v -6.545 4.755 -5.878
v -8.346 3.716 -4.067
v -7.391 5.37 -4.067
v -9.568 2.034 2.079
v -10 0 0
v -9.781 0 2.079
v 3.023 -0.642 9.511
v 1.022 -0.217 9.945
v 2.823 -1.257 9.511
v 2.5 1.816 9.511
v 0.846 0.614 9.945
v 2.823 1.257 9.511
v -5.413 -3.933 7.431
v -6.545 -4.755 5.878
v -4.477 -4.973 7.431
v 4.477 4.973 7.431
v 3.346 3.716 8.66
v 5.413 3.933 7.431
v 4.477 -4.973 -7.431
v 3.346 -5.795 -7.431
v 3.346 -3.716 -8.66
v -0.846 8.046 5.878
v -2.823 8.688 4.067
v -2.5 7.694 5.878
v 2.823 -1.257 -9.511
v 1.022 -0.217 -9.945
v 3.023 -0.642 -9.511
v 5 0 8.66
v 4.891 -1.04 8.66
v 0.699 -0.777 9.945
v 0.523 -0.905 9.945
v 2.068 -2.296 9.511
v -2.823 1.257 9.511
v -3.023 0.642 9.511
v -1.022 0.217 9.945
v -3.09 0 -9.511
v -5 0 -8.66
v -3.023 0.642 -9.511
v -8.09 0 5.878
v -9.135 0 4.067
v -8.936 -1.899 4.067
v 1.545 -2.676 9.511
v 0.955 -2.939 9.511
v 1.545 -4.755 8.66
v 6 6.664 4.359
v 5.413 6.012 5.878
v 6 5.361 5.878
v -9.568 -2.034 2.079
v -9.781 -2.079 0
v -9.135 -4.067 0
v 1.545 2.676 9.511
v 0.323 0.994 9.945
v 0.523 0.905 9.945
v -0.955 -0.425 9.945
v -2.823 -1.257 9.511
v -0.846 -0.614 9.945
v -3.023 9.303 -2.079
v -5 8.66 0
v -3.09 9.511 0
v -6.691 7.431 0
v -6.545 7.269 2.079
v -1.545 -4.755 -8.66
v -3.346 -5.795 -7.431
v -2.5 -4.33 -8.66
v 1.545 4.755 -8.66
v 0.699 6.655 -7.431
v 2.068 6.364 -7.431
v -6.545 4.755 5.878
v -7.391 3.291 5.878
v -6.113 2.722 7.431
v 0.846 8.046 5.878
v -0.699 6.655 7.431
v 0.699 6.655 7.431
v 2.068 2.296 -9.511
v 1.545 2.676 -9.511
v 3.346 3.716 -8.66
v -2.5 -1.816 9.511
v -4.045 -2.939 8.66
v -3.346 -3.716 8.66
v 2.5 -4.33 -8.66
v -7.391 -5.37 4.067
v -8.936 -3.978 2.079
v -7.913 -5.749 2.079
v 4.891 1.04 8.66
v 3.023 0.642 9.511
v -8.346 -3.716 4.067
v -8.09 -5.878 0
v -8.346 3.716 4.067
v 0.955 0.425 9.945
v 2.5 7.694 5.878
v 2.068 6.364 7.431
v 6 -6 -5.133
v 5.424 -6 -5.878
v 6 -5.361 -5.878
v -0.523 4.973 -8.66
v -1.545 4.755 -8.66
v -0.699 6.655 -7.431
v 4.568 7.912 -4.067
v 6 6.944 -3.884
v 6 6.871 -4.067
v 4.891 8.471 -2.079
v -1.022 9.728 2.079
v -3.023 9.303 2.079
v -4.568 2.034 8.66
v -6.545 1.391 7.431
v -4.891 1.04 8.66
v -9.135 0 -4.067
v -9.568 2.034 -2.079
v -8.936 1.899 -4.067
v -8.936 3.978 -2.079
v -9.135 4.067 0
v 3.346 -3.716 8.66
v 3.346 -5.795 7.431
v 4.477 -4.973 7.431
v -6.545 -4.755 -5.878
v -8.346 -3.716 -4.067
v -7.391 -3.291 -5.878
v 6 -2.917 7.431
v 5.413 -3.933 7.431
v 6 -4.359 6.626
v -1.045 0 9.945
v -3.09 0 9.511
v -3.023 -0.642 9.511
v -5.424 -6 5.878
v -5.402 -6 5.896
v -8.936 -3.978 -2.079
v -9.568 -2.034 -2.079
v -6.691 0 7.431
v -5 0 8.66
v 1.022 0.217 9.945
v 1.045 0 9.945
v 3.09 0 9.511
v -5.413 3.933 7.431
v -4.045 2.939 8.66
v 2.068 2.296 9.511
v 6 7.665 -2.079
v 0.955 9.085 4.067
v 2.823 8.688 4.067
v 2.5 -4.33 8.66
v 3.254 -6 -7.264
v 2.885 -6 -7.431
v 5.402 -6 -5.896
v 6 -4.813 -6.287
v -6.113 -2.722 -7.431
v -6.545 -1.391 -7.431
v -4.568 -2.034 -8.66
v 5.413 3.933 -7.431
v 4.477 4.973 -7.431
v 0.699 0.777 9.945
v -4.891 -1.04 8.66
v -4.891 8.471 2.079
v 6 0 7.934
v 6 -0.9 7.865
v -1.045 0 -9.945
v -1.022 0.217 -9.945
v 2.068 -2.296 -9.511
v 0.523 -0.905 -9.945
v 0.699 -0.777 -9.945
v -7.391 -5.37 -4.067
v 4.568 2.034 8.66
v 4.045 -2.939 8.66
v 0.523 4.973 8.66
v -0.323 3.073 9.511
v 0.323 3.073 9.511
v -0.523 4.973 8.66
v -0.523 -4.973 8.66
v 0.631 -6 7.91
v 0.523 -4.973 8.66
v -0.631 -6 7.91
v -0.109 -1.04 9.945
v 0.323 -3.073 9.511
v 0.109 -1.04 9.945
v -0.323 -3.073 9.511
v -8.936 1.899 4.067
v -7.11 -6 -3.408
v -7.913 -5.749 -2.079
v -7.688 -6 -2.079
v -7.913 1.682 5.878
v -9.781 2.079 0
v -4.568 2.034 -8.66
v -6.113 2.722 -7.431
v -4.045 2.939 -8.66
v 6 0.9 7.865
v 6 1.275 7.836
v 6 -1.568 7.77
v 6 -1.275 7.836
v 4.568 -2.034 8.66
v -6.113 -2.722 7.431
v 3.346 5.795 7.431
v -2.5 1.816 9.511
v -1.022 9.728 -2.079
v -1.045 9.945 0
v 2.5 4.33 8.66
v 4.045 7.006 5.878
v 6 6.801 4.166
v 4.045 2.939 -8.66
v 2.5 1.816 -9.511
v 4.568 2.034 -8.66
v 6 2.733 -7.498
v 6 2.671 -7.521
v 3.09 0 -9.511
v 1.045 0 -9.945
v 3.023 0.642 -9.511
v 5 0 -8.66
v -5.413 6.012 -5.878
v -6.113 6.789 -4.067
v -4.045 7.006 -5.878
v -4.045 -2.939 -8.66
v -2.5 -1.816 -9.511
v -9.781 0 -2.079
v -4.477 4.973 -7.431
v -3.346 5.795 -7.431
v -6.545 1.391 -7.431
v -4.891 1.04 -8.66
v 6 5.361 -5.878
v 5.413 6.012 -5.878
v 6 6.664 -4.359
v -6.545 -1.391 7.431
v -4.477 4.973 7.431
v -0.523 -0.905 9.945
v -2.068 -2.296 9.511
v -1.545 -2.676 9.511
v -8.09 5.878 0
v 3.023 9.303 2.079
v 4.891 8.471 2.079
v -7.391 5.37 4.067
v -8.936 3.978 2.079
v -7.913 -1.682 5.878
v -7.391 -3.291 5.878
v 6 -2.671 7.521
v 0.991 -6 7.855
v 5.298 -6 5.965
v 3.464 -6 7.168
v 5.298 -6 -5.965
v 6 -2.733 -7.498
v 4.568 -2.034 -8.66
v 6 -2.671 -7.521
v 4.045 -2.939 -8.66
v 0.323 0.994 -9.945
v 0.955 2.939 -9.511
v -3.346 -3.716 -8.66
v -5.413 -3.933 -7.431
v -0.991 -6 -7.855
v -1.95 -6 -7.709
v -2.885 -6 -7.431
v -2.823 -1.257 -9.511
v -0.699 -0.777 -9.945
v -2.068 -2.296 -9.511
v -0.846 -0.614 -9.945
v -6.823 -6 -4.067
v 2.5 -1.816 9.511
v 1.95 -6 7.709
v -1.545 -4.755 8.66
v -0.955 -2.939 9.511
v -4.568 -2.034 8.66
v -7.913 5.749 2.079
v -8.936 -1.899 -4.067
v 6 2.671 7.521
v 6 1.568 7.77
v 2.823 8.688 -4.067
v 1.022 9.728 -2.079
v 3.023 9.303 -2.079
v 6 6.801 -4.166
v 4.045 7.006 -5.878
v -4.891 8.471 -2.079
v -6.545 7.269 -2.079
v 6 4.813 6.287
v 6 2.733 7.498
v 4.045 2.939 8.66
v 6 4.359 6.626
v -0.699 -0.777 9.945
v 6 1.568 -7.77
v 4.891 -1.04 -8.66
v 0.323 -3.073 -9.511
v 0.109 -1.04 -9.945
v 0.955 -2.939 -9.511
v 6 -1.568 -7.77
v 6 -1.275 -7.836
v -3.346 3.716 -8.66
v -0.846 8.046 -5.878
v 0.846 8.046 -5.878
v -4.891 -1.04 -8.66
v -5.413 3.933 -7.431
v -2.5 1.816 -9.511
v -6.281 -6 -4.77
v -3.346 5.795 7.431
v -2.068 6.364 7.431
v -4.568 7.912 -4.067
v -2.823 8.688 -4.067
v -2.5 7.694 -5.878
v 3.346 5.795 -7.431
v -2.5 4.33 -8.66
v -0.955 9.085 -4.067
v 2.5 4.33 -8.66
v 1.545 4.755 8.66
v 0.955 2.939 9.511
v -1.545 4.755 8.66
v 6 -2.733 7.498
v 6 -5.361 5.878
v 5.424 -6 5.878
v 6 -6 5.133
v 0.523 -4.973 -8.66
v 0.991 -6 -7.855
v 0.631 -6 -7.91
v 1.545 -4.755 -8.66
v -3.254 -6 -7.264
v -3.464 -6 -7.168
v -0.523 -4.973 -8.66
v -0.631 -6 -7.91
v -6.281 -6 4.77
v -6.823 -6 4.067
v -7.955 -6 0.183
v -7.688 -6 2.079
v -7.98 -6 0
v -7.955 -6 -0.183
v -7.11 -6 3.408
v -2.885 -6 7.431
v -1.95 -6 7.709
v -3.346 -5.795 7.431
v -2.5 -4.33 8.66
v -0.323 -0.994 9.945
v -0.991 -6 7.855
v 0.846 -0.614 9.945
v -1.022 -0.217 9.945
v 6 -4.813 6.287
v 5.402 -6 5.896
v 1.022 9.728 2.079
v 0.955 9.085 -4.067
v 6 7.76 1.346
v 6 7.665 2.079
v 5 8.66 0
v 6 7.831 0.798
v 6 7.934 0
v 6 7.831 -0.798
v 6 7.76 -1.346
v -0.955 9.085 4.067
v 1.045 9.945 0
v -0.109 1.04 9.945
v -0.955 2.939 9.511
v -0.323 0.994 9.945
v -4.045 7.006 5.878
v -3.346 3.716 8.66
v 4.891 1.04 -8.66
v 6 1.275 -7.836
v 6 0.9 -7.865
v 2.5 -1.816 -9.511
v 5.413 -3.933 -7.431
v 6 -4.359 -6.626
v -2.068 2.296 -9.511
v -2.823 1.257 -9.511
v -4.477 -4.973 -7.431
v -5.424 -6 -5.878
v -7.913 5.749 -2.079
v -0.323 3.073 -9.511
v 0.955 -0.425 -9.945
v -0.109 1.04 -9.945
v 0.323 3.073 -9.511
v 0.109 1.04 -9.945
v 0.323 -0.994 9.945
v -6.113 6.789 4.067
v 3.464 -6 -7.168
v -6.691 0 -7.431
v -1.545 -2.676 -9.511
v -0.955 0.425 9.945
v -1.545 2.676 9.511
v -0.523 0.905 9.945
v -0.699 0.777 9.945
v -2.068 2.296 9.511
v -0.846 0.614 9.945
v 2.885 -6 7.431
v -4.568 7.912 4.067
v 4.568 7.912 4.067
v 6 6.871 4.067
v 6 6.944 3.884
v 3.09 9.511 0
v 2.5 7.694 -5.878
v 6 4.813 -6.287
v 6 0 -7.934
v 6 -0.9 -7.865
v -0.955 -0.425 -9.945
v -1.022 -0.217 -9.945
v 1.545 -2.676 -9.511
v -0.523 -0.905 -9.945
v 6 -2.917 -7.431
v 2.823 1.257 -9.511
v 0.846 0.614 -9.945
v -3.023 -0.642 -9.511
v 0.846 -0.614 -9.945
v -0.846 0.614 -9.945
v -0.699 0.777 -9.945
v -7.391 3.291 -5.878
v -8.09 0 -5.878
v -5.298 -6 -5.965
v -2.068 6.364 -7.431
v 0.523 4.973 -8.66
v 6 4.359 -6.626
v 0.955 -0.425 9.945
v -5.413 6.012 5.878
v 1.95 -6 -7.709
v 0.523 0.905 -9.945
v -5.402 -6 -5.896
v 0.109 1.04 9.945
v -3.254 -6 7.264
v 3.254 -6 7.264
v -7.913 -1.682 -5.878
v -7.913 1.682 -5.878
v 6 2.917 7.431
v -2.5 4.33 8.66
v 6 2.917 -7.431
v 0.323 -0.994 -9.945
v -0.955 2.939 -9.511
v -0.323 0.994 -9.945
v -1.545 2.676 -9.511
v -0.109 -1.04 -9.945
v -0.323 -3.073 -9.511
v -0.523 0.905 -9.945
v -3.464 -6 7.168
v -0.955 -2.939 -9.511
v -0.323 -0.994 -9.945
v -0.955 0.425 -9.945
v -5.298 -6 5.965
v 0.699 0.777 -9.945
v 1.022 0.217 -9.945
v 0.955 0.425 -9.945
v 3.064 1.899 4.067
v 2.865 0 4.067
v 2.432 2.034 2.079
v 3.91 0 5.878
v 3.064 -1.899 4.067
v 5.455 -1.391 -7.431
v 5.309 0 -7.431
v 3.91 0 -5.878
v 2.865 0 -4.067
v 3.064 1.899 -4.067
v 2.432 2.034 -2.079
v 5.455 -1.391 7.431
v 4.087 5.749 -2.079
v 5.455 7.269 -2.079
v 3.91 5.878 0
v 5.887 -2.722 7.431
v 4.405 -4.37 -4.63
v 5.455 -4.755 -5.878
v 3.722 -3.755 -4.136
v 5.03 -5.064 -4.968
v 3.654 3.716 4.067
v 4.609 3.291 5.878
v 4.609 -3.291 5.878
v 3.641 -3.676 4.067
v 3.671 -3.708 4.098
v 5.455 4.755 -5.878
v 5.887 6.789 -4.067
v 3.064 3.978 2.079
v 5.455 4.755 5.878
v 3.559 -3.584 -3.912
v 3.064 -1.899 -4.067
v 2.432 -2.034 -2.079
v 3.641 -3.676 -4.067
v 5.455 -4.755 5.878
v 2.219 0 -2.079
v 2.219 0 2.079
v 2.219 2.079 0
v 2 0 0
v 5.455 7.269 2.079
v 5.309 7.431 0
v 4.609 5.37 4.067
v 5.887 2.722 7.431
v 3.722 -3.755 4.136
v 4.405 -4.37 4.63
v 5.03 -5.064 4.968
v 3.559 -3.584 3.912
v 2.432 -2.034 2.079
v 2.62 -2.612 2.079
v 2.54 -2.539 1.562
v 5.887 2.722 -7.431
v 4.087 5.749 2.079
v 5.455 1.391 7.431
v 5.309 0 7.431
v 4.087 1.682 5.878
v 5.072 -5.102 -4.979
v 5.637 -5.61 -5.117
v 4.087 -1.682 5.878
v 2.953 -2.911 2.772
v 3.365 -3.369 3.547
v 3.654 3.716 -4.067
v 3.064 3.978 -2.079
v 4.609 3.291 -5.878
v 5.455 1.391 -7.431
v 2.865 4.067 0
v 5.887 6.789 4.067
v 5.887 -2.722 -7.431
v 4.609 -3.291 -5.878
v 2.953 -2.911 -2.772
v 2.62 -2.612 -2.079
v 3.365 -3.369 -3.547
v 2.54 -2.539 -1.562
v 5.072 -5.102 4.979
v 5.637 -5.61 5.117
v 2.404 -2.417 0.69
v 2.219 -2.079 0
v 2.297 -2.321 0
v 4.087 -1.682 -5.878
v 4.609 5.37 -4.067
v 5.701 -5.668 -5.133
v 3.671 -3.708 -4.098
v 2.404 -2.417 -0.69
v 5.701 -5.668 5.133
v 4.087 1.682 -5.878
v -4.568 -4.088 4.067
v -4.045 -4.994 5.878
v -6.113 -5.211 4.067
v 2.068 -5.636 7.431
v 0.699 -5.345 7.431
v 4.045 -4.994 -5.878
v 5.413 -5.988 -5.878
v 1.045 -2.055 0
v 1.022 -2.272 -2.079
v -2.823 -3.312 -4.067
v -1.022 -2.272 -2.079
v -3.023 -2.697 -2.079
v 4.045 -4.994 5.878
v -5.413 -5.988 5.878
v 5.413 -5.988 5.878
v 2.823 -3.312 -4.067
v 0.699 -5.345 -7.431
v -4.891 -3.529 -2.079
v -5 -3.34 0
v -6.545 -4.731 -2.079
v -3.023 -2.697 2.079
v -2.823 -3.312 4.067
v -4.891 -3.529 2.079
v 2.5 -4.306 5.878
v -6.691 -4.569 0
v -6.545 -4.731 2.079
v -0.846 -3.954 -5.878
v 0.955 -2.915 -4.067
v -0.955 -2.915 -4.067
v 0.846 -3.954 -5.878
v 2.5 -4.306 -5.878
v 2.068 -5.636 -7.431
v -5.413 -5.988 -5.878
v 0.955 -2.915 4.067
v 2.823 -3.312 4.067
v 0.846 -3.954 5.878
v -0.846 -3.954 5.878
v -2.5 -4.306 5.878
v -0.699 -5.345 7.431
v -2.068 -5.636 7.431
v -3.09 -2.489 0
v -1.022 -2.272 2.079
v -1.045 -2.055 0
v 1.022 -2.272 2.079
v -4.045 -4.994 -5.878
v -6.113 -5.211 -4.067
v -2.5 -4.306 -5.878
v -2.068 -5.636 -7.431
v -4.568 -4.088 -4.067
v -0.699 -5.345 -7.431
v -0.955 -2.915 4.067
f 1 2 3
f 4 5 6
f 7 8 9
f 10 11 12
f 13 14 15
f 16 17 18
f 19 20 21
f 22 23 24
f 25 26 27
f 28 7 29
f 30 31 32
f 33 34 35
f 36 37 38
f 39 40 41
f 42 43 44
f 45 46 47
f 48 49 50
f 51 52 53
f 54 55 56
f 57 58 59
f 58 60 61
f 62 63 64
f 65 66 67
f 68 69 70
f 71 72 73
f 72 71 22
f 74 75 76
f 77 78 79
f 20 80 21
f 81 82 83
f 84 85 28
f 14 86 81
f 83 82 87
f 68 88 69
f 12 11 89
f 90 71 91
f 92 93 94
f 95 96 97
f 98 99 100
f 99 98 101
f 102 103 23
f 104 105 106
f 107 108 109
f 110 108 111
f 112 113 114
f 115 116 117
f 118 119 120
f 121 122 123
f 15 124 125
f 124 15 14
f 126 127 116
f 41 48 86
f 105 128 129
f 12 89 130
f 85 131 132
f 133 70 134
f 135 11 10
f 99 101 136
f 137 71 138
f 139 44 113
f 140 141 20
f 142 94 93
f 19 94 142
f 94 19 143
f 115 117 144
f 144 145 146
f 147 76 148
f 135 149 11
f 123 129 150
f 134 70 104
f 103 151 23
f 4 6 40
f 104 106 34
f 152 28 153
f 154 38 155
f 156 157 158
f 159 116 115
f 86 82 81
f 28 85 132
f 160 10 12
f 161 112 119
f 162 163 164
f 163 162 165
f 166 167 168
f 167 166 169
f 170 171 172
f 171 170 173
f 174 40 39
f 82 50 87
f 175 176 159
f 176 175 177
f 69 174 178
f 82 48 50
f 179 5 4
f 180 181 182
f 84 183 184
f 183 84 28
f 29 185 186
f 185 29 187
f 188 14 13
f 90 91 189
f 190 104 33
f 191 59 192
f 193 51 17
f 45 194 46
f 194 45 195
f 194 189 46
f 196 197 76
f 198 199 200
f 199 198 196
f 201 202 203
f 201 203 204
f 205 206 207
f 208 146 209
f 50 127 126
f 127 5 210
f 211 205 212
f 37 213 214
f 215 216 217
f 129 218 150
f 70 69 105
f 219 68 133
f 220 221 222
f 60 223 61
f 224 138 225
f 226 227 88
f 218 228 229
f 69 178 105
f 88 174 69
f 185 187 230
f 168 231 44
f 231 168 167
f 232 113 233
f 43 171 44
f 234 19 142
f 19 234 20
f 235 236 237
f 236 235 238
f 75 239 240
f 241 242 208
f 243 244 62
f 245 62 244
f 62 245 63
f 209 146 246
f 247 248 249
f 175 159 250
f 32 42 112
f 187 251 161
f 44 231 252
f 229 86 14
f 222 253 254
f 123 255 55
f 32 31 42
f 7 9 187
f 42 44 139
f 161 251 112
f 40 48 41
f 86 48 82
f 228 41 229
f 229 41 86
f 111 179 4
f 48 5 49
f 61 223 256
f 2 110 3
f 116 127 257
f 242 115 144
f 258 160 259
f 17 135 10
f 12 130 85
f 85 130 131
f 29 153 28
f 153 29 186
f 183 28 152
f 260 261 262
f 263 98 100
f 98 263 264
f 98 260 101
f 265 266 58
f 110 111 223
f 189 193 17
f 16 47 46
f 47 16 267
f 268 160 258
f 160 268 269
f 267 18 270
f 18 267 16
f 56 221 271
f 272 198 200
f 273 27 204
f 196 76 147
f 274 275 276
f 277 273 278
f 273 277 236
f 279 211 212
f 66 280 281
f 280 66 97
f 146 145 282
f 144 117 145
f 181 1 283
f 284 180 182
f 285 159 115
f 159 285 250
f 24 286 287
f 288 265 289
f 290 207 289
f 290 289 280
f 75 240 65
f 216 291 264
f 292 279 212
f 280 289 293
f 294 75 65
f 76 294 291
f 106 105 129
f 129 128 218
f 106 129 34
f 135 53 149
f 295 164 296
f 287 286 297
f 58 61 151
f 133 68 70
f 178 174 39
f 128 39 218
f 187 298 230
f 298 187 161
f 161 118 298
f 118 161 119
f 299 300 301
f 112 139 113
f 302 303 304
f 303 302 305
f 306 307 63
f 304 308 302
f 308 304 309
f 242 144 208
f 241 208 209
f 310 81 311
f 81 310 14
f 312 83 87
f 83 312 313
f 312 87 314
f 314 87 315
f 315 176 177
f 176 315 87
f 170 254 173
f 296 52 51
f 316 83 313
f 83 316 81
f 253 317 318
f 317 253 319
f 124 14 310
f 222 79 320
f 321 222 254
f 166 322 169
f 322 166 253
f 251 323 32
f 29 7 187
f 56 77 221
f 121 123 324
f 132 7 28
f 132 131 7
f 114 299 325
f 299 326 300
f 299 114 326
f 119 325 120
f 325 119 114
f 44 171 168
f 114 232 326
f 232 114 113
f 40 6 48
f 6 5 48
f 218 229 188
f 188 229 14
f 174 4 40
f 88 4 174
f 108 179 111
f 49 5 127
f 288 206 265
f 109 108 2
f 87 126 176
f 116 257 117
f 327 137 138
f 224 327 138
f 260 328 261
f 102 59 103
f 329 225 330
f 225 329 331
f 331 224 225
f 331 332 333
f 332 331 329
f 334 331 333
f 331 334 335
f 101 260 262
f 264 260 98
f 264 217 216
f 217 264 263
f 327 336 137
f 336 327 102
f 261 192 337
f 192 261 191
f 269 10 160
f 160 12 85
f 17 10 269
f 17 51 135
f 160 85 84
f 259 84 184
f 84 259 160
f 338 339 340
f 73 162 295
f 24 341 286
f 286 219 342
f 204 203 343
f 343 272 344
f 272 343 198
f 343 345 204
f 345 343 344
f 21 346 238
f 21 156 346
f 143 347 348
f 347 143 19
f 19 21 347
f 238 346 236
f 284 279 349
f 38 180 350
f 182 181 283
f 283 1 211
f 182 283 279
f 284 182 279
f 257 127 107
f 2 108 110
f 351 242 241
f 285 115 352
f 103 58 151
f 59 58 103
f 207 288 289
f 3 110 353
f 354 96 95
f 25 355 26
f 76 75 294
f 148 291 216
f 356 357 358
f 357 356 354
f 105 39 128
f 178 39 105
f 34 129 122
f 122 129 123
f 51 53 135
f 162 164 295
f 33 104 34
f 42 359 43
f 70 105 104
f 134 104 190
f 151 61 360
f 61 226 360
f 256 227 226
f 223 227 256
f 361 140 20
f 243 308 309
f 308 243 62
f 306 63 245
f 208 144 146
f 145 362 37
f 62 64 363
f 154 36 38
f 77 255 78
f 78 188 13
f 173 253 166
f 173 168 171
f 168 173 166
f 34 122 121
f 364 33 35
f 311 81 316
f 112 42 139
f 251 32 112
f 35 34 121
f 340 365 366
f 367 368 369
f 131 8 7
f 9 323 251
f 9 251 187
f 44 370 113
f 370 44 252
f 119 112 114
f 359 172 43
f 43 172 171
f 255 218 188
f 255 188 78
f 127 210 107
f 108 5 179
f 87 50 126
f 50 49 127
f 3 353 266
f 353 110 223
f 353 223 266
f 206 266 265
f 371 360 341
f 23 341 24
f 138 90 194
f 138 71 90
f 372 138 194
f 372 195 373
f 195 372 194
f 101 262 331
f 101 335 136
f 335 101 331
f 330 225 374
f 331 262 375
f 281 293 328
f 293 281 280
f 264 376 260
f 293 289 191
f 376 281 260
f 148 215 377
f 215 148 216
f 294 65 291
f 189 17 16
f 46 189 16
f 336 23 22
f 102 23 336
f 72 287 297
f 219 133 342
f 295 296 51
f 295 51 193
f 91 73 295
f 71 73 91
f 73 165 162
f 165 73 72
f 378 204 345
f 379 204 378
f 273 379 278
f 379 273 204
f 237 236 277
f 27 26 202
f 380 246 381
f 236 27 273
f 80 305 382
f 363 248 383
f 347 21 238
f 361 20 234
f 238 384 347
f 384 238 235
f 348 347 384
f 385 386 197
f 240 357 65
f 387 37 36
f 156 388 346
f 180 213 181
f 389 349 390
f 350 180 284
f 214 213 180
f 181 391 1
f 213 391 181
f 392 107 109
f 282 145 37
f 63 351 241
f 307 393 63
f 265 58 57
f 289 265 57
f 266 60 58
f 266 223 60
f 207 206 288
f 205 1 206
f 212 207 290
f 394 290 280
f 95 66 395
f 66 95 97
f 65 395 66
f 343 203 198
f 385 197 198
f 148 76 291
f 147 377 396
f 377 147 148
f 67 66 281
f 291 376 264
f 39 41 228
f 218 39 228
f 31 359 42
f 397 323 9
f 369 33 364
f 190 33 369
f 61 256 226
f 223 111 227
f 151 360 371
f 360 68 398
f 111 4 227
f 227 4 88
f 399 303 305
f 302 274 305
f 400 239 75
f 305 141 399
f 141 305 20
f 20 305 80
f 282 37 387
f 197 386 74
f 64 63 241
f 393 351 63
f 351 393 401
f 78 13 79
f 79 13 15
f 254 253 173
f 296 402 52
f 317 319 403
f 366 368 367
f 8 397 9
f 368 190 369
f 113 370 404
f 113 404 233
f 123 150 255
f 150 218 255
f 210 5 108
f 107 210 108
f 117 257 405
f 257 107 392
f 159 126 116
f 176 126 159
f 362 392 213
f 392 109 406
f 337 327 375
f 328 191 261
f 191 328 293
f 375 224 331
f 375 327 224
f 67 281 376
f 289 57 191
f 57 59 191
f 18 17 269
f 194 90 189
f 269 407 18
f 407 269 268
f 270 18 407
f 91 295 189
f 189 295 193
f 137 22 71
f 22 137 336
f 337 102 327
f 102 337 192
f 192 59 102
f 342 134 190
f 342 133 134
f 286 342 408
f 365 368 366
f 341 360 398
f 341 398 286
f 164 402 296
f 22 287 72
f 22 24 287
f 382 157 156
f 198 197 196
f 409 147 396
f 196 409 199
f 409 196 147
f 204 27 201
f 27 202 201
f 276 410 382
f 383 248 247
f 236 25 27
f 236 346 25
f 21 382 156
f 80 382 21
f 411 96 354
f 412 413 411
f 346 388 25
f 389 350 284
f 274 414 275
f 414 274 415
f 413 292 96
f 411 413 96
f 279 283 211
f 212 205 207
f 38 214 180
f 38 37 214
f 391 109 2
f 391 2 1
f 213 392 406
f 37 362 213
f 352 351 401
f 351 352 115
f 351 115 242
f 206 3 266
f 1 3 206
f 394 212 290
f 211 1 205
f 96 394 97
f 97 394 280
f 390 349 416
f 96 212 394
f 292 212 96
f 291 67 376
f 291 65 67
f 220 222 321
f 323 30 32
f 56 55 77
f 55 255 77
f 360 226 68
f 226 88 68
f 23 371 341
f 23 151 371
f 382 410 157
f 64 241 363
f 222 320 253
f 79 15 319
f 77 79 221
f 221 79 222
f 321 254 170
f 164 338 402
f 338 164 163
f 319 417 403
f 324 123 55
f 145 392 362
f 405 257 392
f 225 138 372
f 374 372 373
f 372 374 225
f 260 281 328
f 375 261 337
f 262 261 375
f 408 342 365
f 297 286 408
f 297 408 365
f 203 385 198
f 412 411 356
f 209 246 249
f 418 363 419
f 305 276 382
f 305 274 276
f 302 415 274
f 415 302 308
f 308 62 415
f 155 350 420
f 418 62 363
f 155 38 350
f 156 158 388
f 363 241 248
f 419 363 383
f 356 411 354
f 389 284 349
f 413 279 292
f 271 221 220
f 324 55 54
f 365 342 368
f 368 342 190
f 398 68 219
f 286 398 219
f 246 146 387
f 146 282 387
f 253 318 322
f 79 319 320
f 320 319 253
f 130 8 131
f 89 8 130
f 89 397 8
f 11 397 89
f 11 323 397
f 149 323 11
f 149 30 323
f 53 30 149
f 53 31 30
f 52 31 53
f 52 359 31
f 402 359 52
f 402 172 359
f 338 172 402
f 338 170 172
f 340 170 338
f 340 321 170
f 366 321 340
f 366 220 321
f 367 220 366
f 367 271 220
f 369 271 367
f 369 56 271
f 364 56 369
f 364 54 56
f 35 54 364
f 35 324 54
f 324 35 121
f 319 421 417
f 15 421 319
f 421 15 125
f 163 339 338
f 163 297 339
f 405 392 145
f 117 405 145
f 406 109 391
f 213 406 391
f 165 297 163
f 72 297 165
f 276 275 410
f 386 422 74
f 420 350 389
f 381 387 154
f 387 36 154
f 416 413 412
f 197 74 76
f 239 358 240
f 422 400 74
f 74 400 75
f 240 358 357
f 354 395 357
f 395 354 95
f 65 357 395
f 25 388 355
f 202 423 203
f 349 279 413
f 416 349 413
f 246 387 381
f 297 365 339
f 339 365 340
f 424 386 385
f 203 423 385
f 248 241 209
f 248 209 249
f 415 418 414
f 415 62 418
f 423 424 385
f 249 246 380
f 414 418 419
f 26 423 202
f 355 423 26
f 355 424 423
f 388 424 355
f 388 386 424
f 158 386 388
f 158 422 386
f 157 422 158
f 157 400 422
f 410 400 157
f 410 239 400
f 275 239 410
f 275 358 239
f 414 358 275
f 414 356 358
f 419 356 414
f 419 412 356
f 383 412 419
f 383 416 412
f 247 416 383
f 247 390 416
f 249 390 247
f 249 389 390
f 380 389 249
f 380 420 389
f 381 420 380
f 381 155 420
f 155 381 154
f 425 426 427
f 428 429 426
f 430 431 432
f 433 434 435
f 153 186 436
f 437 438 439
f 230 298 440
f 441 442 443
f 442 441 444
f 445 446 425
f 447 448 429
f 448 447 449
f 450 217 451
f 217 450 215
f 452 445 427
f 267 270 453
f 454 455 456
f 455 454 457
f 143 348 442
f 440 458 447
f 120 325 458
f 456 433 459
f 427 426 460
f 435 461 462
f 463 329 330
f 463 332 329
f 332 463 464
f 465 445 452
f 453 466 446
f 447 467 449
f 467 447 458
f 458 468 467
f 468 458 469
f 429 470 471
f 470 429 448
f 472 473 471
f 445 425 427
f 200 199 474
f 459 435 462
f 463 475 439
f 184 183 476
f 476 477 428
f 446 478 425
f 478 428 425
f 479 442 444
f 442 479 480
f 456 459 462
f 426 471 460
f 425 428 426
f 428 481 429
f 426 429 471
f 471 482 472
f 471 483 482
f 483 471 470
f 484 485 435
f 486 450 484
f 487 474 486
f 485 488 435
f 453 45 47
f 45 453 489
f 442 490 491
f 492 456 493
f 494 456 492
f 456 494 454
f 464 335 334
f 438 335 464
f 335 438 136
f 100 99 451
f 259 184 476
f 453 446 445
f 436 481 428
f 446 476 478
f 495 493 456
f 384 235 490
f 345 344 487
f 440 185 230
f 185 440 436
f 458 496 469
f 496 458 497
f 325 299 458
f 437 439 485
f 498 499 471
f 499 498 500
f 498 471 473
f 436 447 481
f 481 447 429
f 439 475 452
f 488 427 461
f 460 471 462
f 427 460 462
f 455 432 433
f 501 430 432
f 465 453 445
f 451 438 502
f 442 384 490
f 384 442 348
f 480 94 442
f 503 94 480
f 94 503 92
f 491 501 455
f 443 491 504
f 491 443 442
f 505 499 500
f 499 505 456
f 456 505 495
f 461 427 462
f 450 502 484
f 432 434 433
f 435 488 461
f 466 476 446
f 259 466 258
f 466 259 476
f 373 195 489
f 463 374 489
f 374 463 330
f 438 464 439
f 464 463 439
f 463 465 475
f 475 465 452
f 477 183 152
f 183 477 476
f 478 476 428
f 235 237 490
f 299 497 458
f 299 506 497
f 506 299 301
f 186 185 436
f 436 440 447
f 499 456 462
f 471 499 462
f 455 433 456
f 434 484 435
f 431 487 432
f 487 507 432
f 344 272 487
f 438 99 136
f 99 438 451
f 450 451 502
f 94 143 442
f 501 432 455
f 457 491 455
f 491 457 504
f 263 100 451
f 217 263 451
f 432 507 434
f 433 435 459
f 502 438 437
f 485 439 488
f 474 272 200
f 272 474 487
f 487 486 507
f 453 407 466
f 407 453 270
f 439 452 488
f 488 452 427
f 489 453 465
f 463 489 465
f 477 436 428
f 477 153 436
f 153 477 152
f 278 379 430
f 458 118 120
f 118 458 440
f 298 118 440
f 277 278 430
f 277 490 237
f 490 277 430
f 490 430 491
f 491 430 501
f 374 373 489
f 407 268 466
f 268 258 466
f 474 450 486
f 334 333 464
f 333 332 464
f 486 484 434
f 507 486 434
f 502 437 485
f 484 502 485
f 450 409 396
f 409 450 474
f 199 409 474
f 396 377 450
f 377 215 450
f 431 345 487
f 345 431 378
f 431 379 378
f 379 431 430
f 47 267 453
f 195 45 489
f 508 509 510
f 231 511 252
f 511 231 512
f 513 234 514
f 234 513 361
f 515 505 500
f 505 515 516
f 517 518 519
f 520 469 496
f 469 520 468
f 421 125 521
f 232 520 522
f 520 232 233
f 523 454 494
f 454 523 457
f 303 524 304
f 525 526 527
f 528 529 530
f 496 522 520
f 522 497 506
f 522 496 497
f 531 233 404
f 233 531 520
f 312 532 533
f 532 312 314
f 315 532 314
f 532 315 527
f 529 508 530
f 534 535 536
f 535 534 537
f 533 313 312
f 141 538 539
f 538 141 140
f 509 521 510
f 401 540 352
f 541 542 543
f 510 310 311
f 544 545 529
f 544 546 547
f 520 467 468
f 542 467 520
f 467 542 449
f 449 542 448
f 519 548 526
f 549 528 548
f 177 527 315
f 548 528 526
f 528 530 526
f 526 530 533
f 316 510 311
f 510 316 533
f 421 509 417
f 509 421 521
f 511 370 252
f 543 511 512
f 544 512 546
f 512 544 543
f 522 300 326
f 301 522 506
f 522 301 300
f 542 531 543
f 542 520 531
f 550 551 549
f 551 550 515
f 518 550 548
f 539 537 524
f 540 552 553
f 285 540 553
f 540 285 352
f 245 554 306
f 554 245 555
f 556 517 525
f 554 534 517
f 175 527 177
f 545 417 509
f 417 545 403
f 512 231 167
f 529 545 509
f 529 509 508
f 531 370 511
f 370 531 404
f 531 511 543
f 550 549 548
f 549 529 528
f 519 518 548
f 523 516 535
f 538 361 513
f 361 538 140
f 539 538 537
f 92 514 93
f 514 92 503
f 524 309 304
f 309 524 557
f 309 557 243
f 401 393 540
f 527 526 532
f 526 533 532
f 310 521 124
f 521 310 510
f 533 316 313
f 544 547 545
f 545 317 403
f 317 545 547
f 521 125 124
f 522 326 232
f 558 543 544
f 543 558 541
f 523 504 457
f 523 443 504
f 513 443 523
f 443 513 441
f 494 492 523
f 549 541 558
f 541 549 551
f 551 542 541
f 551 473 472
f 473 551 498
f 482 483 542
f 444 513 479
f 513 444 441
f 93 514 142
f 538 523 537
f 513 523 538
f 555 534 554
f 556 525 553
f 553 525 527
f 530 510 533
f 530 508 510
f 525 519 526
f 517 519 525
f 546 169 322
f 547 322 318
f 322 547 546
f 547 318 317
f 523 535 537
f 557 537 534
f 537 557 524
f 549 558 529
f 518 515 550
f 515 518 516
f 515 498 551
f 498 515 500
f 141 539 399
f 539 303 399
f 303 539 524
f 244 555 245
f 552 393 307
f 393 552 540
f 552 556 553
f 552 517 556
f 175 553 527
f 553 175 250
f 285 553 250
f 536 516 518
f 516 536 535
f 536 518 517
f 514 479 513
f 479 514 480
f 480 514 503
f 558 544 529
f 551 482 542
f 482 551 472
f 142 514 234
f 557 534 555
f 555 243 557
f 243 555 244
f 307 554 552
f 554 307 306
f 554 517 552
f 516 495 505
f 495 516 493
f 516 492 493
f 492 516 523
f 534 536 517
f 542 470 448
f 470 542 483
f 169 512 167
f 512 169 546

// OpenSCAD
difference() {
    sphere(r=10);
    translate([12,0,0])
        sphere(r=10);
    translate([0,-12,0])
        sphere(r=10);
}
